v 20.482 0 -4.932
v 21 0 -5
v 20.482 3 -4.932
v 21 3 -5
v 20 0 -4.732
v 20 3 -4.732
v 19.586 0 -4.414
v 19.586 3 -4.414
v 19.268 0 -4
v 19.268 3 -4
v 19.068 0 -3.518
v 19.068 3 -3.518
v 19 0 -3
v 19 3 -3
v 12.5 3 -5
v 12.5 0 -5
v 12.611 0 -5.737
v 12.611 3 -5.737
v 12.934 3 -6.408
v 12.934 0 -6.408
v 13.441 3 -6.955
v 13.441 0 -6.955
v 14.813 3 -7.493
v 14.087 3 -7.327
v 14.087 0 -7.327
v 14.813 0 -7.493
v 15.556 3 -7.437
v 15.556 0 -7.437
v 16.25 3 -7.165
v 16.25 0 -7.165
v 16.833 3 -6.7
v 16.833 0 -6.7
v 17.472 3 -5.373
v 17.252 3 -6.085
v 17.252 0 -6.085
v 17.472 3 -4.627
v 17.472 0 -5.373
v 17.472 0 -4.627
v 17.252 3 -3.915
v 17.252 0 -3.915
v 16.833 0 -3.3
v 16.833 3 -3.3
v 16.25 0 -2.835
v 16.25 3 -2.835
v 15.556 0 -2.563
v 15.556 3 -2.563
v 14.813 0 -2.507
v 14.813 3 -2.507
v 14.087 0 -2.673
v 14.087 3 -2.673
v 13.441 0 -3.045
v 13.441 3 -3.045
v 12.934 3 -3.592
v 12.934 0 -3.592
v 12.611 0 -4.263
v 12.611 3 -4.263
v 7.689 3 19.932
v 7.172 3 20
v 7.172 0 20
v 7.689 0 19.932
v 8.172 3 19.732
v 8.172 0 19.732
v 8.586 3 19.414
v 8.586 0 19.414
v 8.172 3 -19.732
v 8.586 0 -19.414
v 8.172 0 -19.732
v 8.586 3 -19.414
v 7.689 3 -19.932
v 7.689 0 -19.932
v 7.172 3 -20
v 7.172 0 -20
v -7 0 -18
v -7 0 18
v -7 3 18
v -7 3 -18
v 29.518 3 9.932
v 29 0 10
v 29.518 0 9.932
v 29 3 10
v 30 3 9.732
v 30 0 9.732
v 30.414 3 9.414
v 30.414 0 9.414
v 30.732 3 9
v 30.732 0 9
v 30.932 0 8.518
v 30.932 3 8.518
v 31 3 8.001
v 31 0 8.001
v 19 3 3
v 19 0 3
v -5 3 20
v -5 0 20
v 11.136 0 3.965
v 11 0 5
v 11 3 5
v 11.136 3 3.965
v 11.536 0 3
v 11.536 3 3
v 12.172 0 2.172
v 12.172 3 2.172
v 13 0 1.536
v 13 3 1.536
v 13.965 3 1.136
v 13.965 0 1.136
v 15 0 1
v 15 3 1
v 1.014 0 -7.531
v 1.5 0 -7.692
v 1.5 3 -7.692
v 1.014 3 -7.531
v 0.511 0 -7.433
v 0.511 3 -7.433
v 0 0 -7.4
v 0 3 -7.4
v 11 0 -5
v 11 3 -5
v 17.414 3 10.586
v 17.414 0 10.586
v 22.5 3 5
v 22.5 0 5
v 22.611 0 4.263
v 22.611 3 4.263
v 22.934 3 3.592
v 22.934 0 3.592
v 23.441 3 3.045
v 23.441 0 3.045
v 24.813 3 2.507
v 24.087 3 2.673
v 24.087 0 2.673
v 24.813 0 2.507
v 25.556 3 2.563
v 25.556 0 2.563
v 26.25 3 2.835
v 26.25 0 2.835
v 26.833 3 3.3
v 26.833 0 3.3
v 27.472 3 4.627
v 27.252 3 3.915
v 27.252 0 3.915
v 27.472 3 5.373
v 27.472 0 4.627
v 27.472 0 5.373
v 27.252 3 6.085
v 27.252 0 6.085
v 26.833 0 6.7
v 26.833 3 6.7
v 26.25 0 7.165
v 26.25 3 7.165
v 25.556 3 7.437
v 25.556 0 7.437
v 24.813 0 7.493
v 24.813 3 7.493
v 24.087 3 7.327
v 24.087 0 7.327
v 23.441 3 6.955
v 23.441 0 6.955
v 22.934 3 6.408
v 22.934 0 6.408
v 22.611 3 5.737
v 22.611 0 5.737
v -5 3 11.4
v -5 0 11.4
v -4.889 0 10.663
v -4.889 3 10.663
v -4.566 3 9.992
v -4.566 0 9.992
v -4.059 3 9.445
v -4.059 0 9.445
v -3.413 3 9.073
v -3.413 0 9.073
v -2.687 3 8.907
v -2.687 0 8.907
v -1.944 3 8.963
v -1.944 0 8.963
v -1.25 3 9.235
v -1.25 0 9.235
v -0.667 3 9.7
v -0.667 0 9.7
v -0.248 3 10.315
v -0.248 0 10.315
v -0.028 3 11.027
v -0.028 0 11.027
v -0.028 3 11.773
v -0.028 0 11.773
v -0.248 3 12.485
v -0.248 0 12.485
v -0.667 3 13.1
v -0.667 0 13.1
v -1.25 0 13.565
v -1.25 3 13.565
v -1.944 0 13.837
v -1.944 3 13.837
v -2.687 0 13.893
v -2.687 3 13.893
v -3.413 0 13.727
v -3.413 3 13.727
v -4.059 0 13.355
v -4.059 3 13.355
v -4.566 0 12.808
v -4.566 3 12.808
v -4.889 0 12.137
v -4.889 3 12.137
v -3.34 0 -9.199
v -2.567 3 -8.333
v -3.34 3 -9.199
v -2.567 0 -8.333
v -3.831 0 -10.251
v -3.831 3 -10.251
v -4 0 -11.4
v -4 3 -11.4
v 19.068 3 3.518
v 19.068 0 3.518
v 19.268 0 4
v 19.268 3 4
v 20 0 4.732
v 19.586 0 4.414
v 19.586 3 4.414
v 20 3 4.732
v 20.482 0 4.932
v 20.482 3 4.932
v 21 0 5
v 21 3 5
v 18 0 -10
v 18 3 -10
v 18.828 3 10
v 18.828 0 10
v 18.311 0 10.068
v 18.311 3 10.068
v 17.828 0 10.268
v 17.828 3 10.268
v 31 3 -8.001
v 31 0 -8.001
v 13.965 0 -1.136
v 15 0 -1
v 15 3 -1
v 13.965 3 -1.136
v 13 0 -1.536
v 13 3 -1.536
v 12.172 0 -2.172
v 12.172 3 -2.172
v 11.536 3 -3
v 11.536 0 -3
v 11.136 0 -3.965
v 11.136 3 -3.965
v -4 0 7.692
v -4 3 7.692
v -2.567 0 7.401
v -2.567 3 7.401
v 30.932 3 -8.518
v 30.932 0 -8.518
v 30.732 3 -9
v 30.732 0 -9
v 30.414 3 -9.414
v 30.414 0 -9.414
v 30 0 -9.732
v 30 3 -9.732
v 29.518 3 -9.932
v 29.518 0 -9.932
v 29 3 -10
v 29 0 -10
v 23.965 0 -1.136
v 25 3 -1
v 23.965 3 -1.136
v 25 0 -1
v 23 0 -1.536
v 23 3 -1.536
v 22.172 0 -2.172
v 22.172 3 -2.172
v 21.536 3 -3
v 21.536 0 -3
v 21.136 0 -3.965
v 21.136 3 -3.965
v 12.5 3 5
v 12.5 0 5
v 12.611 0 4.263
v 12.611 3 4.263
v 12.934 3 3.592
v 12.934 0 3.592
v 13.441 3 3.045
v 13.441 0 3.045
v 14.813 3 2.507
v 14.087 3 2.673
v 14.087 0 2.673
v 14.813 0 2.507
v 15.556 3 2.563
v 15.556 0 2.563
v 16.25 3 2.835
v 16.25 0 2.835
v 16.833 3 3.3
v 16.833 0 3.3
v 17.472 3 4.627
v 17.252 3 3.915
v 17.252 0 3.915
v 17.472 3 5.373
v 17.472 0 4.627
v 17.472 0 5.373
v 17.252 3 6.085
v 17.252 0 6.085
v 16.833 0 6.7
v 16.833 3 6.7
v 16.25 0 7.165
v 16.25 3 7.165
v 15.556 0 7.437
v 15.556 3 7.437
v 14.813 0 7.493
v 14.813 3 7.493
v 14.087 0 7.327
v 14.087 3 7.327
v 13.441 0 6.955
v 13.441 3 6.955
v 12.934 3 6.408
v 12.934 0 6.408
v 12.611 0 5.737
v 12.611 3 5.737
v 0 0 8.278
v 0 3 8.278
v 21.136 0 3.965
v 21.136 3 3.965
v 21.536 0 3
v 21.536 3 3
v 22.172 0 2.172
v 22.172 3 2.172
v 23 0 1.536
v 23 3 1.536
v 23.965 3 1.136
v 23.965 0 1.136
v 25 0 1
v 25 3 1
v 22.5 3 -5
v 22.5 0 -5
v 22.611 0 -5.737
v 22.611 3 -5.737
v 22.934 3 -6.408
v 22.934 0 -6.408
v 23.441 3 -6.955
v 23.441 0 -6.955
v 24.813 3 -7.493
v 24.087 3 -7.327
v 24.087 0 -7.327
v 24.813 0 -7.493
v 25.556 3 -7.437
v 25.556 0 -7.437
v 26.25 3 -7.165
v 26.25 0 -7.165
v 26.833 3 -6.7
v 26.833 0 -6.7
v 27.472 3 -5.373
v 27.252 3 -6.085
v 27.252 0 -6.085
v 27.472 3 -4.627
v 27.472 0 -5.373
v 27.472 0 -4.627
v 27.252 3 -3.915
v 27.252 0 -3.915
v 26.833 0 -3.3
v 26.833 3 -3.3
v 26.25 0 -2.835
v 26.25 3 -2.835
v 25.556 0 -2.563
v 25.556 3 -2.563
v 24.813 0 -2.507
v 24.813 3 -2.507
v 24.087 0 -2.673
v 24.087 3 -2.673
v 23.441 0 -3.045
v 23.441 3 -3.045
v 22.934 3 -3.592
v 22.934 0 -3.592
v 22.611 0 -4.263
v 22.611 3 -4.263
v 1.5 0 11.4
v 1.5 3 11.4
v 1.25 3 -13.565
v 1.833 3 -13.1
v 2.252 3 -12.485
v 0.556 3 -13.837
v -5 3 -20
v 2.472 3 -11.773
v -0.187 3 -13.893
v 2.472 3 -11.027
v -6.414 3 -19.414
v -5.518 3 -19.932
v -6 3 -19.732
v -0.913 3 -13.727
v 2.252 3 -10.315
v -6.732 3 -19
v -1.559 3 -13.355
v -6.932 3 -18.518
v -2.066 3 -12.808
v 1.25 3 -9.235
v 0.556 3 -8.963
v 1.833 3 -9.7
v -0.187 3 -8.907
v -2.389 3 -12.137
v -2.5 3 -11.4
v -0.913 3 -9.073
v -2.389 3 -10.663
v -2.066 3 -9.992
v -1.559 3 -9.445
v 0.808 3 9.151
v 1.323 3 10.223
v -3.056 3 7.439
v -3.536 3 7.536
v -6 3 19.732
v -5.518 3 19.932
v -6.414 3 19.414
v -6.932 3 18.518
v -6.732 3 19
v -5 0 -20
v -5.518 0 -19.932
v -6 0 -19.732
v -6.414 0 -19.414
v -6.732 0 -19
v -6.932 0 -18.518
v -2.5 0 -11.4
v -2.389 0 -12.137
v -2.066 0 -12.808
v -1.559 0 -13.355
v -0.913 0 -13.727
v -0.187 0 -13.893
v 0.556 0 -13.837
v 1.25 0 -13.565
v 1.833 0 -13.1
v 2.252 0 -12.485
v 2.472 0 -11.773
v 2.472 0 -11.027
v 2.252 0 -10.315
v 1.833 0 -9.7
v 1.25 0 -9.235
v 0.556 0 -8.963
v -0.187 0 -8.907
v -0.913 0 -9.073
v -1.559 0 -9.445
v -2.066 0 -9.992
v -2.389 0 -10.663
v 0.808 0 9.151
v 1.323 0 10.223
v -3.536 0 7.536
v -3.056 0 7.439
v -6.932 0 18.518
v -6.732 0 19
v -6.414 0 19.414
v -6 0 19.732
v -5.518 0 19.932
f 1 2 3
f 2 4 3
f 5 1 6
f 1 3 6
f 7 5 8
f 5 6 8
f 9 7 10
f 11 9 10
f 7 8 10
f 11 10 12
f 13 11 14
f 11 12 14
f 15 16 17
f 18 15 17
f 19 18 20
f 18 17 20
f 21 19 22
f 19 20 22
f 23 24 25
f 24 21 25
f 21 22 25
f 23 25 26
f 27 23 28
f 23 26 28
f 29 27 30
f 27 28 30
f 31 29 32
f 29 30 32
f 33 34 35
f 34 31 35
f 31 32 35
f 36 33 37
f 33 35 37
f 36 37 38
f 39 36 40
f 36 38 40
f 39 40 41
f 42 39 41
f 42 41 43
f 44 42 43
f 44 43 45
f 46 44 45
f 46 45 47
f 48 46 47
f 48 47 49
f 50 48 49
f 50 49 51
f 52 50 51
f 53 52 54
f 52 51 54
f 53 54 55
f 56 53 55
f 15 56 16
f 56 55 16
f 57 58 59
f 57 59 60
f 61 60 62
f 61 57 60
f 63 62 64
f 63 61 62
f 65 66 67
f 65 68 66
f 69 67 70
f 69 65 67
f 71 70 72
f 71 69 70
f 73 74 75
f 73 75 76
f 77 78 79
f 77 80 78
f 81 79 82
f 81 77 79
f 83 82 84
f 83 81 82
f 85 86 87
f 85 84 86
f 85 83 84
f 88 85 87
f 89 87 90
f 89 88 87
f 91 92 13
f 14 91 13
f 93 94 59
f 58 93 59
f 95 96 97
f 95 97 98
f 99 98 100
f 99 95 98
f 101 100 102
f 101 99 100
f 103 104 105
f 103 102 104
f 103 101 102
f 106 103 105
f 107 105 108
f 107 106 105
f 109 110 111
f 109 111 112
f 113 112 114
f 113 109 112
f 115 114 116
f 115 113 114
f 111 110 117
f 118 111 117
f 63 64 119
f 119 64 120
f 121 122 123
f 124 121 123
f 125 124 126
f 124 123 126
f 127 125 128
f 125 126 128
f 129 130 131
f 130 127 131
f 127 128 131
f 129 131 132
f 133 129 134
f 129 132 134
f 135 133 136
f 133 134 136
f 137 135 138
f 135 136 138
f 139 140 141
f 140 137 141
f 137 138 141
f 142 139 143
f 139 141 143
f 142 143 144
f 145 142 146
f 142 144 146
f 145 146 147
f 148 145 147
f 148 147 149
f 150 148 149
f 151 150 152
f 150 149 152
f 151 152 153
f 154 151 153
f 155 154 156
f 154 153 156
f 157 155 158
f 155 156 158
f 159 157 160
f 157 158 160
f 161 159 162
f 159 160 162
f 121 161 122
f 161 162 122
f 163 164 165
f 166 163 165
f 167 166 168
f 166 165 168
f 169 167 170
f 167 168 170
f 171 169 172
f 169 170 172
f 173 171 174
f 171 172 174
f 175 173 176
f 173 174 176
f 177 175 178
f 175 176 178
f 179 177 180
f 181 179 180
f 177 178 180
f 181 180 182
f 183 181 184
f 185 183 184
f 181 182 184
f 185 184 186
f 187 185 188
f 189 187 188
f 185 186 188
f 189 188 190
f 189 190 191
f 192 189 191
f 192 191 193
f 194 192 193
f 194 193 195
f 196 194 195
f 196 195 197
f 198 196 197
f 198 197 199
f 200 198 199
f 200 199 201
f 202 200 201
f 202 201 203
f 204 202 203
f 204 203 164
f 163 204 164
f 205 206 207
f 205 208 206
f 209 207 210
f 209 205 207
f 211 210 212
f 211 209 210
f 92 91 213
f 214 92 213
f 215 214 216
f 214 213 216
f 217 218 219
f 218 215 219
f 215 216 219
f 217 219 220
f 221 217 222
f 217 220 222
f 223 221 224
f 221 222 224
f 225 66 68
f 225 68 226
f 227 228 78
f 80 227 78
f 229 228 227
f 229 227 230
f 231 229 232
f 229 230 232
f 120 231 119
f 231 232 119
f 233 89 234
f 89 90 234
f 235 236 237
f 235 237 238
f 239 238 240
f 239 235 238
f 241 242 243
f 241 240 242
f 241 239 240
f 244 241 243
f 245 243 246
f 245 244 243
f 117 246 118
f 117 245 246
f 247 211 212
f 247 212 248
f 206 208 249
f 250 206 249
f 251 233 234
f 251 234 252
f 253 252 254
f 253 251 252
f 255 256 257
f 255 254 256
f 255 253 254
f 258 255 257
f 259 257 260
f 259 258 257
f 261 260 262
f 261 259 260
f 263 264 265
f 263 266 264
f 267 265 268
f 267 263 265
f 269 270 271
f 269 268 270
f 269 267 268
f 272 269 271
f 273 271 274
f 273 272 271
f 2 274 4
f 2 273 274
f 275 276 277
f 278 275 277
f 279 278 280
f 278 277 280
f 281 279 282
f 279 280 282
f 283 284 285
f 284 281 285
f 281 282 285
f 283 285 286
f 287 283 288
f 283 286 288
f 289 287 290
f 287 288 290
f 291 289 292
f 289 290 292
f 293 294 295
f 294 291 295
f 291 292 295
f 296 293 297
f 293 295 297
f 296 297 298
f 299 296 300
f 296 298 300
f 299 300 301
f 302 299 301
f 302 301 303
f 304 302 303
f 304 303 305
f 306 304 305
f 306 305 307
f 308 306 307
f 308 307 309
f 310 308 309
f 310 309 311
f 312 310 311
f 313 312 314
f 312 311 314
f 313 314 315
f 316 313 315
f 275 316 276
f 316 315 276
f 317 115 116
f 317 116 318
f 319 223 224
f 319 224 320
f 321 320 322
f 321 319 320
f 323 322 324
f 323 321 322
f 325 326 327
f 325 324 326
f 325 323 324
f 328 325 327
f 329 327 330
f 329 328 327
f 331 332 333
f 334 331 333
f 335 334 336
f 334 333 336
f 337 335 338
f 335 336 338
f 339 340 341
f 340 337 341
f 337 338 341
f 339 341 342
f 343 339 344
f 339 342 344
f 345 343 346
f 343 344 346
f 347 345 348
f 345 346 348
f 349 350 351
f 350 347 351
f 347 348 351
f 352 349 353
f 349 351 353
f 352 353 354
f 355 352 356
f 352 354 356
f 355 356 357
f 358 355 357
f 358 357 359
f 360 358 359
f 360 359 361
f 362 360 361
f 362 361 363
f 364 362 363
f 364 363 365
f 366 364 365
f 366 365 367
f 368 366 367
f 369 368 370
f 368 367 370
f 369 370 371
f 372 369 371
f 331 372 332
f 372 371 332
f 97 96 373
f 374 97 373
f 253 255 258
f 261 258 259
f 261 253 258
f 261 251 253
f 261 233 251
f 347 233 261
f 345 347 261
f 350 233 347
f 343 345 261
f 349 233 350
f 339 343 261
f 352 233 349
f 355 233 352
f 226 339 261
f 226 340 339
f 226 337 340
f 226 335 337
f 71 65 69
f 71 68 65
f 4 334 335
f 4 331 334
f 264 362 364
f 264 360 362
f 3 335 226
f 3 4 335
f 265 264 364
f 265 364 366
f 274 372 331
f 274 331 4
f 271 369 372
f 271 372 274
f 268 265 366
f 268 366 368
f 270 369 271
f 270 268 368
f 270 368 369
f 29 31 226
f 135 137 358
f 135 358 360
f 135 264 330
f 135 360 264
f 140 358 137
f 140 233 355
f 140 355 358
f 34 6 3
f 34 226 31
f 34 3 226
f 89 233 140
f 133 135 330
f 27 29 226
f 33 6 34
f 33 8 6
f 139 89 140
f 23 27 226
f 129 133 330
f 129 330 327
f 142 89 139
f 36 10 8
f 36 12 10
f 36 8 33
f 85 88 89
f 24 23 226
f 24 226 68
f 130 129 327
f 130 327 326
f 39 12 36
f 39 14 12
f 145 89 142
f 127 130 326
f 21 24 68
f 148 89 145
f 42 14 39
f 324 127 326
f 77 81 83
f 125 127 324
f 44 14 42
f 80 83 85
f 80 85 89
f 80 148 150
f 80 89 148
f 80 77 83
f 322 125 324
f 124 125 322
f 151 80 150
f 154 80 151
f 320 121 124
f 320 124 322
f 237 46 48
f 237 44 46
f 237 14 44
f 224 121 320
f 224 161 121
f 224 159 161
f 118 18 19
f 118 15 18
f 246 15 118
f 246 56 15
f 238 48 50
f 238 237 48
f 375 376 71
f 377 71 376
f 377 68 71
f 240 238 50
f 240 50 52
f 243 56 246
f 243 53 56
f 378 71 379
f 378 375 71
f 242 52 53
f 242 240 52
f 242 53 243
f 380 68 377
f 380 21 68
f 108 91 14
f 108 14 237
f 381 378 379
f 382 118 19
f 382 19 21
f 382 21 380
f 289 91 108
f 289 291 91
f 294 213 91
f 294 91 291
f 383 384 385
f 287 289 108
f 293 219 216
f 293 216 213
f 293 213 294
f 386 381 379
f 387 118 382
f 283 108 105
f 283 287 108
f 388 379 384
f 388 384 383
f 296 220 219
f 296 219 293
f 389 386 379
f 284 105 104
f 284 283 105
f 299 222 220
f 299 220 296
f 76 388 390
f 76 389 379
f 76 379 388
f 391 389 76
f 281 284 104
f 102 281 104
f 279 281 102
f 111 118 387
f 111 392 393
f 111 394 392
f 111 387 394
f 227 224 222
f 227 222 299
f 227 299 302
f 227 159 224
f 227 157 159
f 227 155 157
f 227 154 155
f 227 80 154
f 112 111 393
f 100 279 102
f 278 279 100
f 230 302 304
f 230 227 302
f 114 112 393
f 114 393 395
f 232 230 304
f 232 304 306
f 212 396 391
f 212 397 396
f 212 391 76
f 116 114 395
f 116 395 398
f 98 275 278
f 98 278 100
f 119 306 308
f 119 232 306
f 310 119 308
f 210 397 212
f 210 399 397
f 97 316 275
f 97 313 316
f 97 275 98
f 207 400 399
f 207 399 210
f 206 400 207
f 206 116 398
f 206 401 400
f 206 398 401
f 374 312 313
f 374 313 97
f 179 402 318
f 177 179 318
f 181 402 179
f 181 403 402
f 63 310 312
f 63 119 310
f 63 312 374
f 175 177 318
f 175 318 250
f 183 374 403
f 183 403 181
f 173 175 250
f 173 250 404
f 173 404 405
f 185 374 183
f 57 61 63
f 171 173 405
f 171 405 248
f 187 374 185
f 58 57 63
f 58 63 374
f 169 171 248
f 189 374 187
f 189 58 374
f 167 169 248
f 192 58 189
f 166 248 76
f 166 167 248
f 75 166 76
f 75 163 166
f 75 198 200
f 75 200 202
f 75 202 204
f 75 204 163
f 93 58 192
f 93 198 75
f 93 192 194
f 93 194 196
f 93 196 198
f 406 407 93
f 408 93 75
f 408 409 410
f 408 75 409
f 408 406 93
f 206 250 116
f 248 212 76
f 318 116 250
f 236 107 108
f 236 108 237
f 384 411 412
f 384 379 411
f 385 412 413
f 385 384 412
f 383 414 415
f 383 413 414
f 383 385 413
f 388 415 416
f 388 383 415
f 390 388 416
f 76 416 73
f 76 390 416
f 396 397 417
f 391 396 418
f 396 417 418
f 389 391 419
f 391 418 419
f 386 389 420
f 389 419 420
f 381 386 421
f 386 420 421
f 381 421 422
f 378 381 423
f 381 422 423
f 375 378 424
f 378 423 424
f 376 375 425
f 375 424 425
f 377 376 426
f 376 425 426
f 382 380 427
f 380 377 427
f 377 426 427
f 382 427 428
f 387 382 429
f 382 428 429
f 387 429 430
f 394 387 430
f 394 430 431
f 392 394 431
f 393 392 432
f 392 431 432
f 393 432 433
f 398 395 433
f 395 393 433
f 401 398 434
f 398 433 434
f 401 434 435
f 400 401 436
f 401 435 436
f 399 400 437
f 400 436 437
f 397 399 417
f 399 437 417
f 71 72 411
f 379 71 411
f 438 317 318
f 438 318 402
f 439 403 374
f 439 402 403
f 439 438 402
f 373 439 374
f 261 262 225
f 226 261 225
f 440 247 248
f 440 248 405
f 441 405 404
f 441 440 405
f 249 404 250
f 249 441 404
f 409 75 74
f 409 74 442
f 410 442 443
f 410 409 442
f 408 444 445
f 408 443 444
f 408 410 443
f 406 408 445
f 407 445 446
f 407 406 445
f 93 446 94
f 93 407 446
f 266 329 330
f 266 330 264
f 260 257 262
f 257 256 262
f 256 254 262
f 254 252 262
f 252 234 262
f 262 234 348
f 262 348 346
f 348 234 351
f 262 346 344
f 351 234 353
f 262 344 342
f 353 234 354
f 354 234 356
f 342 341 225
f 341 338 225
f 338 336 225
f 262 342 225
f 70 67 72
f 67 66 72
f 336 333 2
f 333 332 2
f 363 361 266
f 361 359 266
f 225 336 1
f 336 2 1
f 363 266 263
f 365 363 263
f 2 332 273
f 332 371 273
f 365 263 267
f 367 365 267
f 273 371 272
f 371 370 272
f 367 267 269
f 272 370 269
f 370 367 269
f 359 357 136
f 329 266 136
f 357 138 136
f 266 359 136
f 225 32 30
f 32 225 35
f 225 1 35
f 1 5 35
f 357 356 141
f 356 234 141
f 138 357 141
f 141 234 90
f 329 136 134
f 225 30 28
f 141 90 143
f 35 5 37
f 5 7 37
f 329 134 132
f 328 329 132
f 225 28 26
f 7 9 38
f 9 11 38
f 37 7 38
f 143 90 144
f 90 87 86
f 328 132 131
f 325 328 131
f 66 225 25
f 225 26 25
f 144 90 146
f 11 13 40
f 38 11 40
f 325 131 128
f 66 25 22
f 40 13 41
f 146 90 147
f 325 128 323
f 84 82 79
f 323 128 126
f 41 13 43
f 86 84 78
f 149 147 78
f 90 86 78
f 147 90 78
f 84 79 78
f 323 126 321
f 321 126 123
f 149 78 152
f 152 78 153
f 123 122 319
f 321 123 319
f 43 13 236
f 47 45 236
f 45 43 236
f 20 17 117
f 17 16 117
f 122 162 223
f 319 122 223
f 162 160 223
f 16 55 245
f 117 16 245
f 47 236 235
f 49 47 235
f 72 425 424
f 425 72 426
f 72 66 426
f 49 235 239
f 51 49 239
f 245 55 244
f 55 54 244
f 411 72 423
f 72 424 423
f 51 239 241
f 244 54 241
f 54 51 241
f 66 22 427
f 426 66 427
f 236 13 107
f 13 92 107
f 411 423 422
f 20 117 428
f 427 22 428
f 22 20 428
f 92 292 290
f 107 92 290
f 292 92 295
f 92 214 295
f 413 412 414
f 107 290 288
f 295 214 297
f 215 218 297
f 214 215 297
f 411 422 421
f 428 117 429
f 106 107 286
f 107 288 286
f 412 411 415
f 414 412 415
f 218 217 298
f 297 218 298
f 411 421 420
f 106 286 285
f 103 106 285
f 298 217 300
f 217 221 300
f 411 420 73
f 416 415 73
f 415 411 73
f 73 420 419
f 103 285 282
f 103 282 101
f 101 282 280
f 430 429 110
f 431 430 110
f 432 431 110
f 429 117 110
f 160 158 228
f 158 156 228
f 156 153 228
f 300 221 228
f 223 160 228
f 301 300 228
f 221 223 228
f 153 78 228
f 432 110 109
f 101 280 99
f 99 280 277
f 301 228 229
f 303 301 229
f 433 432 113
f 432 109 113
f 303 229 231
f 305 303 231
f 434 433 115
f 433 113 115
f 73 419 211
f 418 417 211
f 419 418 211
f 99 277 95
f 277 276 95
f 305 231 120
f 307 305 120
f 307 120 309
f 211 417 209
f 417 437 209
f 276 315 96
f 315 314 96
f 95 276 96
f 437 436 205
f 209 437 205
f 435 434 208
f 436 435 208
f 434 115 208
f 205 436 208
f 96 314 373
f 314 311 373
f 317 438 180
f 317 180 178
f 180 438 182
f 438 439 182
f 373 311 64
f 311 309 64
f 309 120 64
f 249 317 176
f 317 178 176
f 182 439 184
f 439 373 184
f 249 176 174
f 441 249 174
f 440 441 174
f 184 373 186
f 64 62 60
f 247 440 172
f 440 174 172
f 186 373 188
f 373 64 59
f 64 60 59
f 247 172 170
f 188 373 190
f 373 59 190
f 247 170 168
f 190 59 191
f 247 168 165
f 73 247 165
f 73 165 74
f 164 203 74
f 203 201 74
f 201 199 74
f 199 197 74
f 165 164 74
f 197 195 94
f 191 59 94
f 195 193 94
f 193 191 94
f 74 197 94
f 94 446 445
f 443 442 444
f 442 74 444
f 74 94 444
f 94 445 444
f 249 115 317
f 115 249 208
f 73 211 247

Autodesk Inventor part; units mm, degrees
ref_plane "YZ Plane" through (0, 0, 0) normal (1, 0, 0) x (0, 1, 0)
ref_plane "XZ Plane" through (0, 0, 0) normal (0, 1, 0) x (-1, 0, 0)
ref_plane "XY Plane" through (0, 0, 0) normal (0, 0, 1) x (1, 0, 0)
sketch "Sketch1" plane through (0, 0, 0) normal (0, 1, 0) x (-1, 0, 0)
  line L0 (16, 0) -> (-17, 0) construction
  line L1 (0, 17) -> (0, -22.3854) construction
  circle A0 centre (0, -11.4) radius 2.5
  line L2 (18, 20) -> (-18, 20)
  line L3 (-18, 20) -> (-18, -20)
  line L4 (-18, -20) -> (18, -20)
  line L5 (18, -20) -> (18, 20)
  line L6 (18, 20) -> (-18, -20) construction
  line L7 (-18, 20) -> (18, -20) construction
  circle A1 centre (-15, 5) radius 2.5
  circle A2 centre (-15, -5) radius 2.5
  line L8 (0, 20) -> (7, 20)
  line L9 (7, 20) -> (7, -20)
  line L10 (7, -20) -> (0, -20)
  line L11 (0, -20) -> (0, 20)
  line L12 (-18, 20) -> (-8, 20)
  line L13 (-8, 20) -> (-18, 10)
  line L14 (-8, -20) -> (-18, -10)
  circle A3 centre (0, -11.4) radius 4
  circle A4 centre (-15, 5) radius 1.5183
  circle A5 centre (-15, 5) radius 4
  circle A6 centre (-15, -5) radius 4
  line L15 (-15, 1) -> (-15, -1)
  line L16 (-18, 10) -> (-31, 10)
  line L17 (-31, 10) -> (-31, -10)
  line L18 (-31, -10) -> (-18, -10)
  line L19 (-18, -10) -> (-18, 10)
  circle A7 centre (-25, -5) radius 2.5
  circle A8 centre (-25, -5) radius 4
  circle A9 centre (-25, 5) radius 2.5
  circle A10 centre (-25, 5) radius 4
  line L20 (-19, 5) -> (-21, 5)
  line L21 (-25, 1) -> (-25, -1)
  line L22 (-21, -5) -> (-19, -5)
  line L23 (-19, 5) -> (-19, -5)
  circle A11 centre (2.5, 11.4) radius 2.5
  circle A12 centre (2.5, 11.4) radius 4
  line L24 (2.5674, -8.3326) -> (2.5674, 7.4006)
  line L25 (4, -11.4) -> (4, 7.6919)
  line L26 (-11, 5) -> (-1.5, 11.4)
  line L27 (-1.5, -7.6919) -> (-11, -5)
  point P0 (0, 0)
  point P1 (-13.4817, 5)
  point P2 (-4, -11.4)
  point P3 (-15.4402, 3.5469)
  point P4 (2.5674, 8.3326)
  point P5 (0, -7.4)
  point P6 (-11, -5)
  point P7 (1.9692, -7.9183)
  point P8 (0, -15.4)
  point P9 (0, 8.2775)
  point P10 (-18, 2.3542)
  point P11 (-18, -2.3542)
  point P12 (-18, -7.6458)
  point P13 (-18, 7.6458)
  dimension "d2" = 36
  dimension "d3" = 40
  dimension "d4" = 5
  dimension "d6" = 5
  dimension "d8" = 10
  dimension "d9" = 45
  dimension "d13" = 8
  dimension "d15" = 8
  dimension "d16" = 8
  dimension "d17" = 13
  dimension "d18" = 5
  dimension "d19" = 10
  dimension "d20" = 8
  dimension "d22" = 5
  dimension "d23" = 4.5
  dimension "d24" = 8
extrude "Extrusion1" add sketch "Sketch1" along normal blind 3 contours A0 L11 A3 | A0 L11 A3 | L11 A12 L24 A3 | A3 L25 A12 L11 L2 L9 L4 | L11 L4 L14 L3 A6 L27 A3 | A12 L11 | L11 A12 | L26 A5 L3 L13 L2 L11 A12 | A6 L3 | A5 L3 | A6 L3 A5 L15 | A6 L3 | L3 L18 L17 L16 A5 L20 A10 L21 A8 L22 A6 | L3 A5 | A6 L23 A5 L3 | A8 | A10
fillet "Fillet1" radius 2 9 edges at (18, 1.5, 10) (8, 1.5, -20) (-7, 1.5, -20) (-7, 1.5, 20) (8, 1.5, 20) (31, 1.5, 10) (31, 1.5, -10) (19, 1.5, 5) (19, 1.5, -5)
properties part number "Base_3DPrint"
